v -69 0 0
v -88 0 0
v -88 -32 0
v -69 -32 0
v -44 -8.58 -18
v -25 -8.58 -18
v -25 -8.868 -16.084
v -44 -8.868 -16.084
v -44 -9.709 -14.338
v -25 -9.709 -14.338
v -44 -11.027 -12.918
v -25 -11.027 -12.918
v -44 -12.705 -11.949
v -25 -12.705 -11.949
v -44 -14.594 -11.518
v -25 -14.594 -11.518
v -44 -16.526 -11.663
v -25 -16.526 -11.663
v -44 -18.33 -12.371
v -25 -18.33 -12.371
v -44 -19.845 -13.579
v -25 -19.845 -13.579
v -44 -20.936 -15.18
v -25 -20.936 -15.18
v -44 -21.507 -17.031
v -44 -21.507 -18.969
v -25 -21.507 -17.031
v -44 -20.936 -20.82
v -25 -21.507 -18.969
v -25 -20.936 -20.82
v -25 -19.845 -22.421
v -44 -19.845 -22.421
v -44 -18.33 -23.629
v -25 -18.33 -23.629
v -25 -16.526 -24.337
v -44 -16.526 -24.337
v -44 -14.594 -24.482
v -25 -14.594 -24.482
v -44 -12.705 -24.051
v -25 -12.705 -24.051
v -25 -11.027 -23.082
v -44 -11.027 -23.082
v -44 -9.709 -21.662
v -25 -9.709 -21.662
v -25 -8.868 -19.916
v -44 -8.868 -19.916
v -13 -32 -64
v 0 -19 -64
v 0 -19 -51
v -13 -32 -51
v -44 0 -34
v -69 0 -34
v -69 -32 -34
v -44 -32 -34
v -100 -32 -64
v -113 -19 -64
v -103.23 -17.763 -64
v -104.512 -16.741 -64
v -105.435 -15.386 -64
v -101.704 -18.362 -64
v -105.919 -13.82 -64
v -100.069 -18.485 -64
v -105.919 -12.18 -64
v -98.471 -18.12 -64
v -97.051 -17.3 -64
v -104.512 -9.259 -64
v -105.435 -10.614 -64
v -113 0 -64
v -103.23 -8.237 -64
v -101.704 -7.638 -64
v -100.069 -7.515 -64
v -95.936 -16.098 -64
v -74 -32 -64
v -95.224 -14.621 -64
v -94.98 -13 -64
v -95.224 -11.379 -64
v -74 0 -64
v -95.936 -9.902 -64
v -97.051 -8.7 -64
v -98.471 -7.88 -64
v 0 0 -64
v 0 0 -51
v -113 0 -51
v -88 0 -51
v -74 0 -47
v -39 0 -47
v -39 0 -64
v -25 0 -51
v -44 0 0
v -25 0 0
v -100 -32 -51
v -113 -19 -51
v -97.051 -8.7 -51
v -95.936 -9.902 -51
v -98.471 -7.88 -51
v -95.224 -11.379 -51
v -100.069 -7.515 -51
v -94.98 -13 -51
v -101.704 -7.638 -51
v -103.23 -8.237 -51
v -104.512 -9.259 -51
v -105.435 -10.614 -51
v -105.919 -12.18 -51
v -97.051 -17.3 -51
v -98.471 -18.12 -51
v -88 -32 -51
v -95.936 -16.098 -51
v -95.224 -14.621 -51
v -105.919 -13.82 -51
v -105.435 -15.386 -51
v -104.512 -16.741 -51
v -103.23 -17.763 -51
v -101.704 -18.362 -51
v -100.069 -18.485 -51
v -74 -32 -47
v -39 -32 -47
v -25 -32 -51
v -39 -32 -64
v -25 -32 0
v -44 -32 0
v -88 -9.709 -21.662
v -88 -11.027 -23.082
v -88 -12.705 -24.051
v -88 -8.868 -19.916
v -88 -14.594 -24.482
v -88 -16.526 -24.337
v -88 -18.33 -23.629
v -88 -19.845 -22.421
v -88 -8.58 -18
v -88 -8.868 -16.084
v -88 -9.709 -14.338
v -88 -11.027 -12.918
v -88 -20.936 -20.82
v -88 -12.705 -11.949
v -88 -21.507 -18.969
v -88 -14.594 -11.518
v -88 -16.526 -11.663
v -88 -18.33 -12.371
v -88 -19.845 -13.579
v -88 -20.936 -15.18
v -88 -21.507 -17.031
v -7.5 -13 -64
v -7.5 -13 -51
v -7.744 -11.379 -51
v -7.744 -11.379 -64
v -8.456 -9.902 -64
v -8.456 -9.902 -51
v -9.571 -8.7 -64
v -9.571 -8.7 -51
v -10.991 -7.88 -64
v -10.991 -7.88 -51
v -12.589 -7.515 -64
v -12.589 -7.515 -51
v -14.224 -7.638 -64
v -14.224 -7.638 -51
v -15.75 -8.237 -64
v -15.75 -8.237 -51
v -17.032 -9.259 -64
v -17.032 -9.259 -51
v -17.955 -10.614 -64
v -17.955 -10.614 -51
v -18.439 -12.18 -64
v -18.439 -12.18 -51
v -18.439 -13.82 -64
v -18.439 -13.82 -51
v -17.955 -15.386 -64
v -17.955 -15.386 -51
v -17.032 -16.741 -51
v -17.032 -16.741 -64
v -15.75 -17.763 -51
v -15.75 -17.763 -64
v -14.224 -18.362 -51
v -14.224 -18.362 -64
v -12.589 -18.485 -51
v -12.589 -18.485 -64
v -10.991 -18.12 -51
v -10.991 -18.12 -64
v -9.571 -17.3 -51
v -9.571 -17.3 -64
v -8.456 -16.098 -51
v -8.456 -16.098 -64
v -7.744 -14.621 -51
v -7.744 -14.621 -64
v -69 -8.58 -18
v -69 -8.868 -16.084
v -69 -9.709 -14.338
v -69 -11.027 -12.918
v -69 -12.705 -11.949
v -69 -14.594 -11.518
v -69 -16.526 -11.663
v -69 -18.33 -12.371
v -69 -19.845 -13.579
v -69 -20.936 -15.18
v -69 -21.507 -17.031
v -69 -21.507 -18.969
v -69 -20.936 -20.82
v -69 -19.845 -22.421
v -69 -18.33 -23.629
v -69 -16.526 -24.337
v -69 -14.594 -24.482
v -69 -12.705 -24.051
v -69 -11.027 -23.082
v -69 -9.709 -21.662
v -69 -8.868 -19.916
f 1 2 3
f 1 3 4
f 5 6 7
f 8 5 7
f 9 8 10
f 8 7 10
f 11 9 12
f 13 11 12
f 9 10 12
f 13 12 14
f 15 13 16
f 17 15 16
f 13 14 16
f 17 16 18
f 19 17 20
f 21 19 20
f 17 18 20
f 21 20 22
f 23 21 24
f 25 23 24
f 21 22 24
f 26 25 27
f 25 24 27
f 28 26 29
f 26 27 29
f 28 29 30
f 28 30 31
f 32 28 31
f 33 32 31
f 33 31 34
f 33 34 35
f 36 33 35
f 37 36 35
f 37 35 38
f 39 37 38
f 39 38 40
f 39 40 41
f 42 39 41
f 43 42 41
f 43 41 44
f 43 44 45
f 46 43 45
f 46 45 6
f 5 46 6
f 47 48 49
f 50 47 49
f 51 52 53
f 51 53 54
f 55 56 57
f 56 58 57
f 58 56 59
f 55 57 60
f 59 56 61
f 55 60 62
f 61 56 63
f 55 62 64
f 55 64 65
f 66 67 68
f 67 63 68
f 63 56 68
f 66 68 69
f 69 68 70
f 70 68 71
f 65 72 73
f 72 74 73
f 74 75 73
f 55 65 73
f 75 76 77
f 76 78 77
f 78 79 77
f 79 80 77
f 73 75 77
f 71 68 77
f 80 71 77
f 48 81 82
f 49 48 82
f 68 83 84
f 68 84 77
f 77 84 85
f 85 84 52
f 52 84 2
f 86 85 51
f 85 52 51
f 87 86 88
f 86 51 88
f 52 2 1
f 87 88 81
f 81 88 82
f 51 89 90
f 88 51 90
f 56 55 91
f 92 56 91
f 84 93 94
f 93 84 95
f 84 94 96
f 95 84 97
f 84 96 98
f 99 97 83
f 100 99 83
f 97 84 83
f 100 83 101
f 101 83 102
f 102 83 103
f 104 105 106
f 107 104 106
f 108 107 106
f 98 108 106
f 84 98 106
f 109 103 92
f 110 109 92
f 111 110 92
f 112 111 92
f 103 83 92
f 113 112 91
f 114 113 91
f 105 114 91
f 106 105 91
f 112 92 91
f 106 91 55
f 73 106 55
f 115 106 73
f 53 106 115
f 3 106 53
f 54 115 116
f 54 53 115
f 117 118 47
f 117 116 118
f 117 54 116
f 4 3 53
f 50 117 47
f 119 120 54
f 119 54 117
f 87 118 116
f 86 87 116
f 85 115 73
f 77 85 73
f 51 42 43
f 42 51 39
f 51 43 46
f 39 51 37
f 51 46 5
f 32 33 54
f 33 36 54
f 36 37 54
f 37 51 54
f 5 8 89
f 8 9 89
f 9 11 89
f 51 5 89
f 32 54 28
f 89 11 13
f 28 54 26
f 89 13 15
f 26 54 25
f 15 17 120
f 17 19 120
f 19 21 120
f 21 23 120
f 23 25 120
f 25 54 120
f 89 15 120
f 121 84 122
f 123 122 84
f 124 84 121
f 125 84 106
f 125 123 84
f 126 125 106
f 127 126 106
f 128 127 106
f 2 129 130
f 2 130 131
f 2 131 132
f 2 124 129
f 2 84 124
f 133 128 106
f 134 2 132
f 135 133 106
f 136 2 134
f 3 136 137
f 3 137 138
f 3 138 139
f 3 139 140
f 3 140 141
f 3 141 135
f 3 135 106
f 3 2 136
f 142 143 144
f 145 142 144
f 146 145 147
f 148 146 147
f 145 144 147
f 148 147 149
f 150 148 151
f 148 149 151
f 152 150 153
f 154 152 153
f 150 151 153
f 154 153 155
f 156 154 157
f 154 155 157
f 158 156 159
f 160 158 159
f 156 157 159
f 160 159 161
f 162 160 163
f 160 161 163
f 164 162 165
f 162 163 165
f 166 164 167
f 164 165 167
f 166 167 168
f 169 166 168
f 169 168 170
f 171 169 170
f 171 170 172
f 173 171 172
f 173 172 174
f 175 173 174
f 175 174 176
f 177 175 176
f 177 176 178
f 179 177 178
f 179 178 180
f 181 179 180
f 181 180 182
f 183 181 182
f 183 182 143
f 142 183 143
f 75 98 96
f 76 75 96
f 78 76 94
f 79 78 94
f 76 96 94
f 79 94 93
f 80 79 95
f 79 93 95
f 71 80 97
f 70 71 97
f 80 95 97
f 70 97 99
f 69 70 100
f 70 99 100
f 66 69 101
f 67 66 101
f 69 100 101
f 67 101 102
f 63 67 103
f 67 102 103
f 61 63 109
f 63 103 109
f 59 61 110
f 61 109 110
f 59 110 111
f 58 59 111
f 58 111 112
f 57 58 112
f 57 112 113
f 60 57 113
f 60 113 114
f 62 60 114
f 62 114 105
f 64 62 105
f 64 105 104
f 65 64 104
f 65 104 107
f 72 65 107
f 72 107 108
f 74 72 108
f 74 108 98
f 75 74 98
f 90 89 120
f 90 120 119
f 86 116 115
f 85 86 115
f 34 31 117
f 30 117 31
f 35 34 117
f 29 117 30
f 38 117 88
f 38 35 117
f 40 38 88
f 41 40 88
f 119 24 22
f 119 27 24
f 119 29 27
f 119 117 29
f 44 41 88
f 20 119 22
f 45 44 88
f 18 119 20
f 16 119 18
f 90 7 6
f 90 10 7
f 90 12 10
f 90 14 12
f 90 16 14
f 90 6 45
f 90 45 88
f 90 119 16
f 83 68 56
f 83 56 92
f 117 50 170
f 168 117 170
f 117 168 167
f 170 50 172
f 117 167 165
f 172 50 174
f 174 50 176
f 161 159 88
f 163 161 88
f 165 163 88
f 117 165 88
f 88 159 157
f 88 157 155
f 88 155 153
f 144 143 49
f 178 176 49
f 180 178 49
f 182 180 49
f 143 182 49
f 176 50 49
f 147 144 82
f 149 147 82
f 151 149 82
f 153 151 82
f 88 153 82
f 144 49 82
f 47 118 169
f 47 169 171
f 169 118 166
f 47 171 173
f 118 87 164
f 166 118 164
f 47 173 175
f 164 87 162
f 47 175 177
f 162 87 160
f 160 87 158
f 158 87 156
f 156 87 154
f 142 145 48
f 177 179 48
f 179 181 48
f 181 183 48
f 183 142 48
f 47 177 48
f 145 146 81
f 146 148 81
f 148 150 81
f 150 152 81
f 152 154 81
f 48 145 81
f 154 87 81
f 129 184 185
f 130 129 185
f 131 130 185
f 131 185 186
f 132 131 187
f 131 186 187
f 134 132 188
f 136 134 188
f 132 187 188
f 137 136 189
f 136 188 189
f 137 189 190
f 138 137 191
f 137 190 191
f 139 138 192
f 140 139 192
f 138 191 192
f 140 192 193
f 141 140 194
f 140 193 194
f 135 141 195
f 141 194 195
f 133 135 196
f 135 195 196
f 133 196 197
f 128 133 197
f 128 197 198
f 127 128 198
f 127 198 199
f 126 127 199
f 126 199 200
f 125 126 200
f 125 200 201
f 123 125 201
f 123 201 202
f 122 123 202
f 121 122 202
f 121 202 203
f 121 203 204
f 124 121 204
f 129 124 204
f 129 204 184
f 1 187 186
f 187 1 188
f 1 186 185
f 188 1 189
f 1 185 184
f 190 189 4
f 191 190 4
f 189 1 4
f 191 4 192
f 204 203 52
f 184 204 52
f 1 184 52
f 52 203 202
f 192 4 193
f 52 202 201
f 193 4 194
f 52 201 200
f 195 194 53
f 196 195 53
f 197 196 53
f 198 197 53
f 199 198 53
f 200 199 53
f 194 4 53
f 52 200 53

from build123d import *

# Parameters (mm, degrees)
F0_W      = 113
F0_H      = 64
F1_DEPTH  = 32
F2_W      = 32
F2_H      = 51
F3_DEPTH  = 25
F4_W      = 32
F4_H      = 51
F5_DEPTH  = 25
F7_DEPTH  = 32.001
F9_DEPTH  = 32.001
F10_SIZE  = 13
F11_SIZE  = 13
F12_R     = 5.5
F13_DEPTH = 13.001
F14_R     = 6.5
F15_DEPTH = 88.001


with BuildPart() as f1:
    # F0 (on Front) → F1 (new body)
    with BuildSketch(Plane.XZ):
        with Locations((-56.5, -32)):
            Rectangle(F0_W, F0_H)
    extrude(amount=F1_DEPTH)

    # F2 (on face) → F3 (cut)
    with BuildSketch(Plane.YZ):
        with Locations((-16, -25.5)):
            Rectangle(F2_W, F2_H)
    extrude(amount=-F3_DEPTH, mode=Mode.SUBTRACT)

    # F4 (on face) → F5 (cut)
    with BuildSketch(Plane(origin=(-113, 0, 0), x_dir=(0, -1, 0), z_dir=(-1, 0, 0))):
        with Locations((16, -25.5)):
            Rectangle(F4_W, F4_H)
    extrude(amount=-F5_DEPTH, mode=Mode.SUBTRACT)

    # F6 (on face) → F7 (cut, through all)
    with BuildSketch(Plane.XZ.offset(32)):
        Polygon((-39, -47), (-56.5, -47), (-74, -47), (-74, -64), (-56.5, -64), (-39, -64), align=None)
    extrude(amount=-F7_DEPTH, mode=Mode.SUBTRACT)

    # F8 (on face) → F9 (cut, through all)
    with BuildSketch(Plane.XZ.offset(32)):
        Polygon((-69, -34), (-56.5, -34), (-44, -34), (-44, 0), (-56.5, 0), (-69, 0), align=None)
    extrude(amount=-F9_DEPTH, mode=Mode.SUBTRACT)

    # F10
    f10_edges = [f1.edges().sort_by_distance(p)[0] for p in [
        (-113, -32, -57.5),
    ]]
    chamfer(f10_edges, length=F10_SIZE)

    # F11
    f11_edges = [f1.edges().sort_by_distance(p)[0] for p in [
        (0, -32, -57.5),
    ]]
    chamfer(f11_edges, length=F11_SIZE)

    # F12 (on face) → F13 (cut, through all)
    with BuildSketch(Plane.XY.offset(-51)):
        with Locations((-100.480012, -12.999985)):
            Circle(F12_R)
        with Locations((-13, -13)):
            Circle(F12_R)
    extrude(amount=-F13_DEPTH, mode=Mode.SUBTRACT)

    # F14 (on face) → F15 (cut, through all)
    with BuildSketch(Plane.YZ.offset(-25)):
        with Locations((-15.079716, -18)):
            Circle(F14_R)
    extrude(amount=-F15_DEPTH, mode=Mode.SUBTRACT)


solid = f1.part
